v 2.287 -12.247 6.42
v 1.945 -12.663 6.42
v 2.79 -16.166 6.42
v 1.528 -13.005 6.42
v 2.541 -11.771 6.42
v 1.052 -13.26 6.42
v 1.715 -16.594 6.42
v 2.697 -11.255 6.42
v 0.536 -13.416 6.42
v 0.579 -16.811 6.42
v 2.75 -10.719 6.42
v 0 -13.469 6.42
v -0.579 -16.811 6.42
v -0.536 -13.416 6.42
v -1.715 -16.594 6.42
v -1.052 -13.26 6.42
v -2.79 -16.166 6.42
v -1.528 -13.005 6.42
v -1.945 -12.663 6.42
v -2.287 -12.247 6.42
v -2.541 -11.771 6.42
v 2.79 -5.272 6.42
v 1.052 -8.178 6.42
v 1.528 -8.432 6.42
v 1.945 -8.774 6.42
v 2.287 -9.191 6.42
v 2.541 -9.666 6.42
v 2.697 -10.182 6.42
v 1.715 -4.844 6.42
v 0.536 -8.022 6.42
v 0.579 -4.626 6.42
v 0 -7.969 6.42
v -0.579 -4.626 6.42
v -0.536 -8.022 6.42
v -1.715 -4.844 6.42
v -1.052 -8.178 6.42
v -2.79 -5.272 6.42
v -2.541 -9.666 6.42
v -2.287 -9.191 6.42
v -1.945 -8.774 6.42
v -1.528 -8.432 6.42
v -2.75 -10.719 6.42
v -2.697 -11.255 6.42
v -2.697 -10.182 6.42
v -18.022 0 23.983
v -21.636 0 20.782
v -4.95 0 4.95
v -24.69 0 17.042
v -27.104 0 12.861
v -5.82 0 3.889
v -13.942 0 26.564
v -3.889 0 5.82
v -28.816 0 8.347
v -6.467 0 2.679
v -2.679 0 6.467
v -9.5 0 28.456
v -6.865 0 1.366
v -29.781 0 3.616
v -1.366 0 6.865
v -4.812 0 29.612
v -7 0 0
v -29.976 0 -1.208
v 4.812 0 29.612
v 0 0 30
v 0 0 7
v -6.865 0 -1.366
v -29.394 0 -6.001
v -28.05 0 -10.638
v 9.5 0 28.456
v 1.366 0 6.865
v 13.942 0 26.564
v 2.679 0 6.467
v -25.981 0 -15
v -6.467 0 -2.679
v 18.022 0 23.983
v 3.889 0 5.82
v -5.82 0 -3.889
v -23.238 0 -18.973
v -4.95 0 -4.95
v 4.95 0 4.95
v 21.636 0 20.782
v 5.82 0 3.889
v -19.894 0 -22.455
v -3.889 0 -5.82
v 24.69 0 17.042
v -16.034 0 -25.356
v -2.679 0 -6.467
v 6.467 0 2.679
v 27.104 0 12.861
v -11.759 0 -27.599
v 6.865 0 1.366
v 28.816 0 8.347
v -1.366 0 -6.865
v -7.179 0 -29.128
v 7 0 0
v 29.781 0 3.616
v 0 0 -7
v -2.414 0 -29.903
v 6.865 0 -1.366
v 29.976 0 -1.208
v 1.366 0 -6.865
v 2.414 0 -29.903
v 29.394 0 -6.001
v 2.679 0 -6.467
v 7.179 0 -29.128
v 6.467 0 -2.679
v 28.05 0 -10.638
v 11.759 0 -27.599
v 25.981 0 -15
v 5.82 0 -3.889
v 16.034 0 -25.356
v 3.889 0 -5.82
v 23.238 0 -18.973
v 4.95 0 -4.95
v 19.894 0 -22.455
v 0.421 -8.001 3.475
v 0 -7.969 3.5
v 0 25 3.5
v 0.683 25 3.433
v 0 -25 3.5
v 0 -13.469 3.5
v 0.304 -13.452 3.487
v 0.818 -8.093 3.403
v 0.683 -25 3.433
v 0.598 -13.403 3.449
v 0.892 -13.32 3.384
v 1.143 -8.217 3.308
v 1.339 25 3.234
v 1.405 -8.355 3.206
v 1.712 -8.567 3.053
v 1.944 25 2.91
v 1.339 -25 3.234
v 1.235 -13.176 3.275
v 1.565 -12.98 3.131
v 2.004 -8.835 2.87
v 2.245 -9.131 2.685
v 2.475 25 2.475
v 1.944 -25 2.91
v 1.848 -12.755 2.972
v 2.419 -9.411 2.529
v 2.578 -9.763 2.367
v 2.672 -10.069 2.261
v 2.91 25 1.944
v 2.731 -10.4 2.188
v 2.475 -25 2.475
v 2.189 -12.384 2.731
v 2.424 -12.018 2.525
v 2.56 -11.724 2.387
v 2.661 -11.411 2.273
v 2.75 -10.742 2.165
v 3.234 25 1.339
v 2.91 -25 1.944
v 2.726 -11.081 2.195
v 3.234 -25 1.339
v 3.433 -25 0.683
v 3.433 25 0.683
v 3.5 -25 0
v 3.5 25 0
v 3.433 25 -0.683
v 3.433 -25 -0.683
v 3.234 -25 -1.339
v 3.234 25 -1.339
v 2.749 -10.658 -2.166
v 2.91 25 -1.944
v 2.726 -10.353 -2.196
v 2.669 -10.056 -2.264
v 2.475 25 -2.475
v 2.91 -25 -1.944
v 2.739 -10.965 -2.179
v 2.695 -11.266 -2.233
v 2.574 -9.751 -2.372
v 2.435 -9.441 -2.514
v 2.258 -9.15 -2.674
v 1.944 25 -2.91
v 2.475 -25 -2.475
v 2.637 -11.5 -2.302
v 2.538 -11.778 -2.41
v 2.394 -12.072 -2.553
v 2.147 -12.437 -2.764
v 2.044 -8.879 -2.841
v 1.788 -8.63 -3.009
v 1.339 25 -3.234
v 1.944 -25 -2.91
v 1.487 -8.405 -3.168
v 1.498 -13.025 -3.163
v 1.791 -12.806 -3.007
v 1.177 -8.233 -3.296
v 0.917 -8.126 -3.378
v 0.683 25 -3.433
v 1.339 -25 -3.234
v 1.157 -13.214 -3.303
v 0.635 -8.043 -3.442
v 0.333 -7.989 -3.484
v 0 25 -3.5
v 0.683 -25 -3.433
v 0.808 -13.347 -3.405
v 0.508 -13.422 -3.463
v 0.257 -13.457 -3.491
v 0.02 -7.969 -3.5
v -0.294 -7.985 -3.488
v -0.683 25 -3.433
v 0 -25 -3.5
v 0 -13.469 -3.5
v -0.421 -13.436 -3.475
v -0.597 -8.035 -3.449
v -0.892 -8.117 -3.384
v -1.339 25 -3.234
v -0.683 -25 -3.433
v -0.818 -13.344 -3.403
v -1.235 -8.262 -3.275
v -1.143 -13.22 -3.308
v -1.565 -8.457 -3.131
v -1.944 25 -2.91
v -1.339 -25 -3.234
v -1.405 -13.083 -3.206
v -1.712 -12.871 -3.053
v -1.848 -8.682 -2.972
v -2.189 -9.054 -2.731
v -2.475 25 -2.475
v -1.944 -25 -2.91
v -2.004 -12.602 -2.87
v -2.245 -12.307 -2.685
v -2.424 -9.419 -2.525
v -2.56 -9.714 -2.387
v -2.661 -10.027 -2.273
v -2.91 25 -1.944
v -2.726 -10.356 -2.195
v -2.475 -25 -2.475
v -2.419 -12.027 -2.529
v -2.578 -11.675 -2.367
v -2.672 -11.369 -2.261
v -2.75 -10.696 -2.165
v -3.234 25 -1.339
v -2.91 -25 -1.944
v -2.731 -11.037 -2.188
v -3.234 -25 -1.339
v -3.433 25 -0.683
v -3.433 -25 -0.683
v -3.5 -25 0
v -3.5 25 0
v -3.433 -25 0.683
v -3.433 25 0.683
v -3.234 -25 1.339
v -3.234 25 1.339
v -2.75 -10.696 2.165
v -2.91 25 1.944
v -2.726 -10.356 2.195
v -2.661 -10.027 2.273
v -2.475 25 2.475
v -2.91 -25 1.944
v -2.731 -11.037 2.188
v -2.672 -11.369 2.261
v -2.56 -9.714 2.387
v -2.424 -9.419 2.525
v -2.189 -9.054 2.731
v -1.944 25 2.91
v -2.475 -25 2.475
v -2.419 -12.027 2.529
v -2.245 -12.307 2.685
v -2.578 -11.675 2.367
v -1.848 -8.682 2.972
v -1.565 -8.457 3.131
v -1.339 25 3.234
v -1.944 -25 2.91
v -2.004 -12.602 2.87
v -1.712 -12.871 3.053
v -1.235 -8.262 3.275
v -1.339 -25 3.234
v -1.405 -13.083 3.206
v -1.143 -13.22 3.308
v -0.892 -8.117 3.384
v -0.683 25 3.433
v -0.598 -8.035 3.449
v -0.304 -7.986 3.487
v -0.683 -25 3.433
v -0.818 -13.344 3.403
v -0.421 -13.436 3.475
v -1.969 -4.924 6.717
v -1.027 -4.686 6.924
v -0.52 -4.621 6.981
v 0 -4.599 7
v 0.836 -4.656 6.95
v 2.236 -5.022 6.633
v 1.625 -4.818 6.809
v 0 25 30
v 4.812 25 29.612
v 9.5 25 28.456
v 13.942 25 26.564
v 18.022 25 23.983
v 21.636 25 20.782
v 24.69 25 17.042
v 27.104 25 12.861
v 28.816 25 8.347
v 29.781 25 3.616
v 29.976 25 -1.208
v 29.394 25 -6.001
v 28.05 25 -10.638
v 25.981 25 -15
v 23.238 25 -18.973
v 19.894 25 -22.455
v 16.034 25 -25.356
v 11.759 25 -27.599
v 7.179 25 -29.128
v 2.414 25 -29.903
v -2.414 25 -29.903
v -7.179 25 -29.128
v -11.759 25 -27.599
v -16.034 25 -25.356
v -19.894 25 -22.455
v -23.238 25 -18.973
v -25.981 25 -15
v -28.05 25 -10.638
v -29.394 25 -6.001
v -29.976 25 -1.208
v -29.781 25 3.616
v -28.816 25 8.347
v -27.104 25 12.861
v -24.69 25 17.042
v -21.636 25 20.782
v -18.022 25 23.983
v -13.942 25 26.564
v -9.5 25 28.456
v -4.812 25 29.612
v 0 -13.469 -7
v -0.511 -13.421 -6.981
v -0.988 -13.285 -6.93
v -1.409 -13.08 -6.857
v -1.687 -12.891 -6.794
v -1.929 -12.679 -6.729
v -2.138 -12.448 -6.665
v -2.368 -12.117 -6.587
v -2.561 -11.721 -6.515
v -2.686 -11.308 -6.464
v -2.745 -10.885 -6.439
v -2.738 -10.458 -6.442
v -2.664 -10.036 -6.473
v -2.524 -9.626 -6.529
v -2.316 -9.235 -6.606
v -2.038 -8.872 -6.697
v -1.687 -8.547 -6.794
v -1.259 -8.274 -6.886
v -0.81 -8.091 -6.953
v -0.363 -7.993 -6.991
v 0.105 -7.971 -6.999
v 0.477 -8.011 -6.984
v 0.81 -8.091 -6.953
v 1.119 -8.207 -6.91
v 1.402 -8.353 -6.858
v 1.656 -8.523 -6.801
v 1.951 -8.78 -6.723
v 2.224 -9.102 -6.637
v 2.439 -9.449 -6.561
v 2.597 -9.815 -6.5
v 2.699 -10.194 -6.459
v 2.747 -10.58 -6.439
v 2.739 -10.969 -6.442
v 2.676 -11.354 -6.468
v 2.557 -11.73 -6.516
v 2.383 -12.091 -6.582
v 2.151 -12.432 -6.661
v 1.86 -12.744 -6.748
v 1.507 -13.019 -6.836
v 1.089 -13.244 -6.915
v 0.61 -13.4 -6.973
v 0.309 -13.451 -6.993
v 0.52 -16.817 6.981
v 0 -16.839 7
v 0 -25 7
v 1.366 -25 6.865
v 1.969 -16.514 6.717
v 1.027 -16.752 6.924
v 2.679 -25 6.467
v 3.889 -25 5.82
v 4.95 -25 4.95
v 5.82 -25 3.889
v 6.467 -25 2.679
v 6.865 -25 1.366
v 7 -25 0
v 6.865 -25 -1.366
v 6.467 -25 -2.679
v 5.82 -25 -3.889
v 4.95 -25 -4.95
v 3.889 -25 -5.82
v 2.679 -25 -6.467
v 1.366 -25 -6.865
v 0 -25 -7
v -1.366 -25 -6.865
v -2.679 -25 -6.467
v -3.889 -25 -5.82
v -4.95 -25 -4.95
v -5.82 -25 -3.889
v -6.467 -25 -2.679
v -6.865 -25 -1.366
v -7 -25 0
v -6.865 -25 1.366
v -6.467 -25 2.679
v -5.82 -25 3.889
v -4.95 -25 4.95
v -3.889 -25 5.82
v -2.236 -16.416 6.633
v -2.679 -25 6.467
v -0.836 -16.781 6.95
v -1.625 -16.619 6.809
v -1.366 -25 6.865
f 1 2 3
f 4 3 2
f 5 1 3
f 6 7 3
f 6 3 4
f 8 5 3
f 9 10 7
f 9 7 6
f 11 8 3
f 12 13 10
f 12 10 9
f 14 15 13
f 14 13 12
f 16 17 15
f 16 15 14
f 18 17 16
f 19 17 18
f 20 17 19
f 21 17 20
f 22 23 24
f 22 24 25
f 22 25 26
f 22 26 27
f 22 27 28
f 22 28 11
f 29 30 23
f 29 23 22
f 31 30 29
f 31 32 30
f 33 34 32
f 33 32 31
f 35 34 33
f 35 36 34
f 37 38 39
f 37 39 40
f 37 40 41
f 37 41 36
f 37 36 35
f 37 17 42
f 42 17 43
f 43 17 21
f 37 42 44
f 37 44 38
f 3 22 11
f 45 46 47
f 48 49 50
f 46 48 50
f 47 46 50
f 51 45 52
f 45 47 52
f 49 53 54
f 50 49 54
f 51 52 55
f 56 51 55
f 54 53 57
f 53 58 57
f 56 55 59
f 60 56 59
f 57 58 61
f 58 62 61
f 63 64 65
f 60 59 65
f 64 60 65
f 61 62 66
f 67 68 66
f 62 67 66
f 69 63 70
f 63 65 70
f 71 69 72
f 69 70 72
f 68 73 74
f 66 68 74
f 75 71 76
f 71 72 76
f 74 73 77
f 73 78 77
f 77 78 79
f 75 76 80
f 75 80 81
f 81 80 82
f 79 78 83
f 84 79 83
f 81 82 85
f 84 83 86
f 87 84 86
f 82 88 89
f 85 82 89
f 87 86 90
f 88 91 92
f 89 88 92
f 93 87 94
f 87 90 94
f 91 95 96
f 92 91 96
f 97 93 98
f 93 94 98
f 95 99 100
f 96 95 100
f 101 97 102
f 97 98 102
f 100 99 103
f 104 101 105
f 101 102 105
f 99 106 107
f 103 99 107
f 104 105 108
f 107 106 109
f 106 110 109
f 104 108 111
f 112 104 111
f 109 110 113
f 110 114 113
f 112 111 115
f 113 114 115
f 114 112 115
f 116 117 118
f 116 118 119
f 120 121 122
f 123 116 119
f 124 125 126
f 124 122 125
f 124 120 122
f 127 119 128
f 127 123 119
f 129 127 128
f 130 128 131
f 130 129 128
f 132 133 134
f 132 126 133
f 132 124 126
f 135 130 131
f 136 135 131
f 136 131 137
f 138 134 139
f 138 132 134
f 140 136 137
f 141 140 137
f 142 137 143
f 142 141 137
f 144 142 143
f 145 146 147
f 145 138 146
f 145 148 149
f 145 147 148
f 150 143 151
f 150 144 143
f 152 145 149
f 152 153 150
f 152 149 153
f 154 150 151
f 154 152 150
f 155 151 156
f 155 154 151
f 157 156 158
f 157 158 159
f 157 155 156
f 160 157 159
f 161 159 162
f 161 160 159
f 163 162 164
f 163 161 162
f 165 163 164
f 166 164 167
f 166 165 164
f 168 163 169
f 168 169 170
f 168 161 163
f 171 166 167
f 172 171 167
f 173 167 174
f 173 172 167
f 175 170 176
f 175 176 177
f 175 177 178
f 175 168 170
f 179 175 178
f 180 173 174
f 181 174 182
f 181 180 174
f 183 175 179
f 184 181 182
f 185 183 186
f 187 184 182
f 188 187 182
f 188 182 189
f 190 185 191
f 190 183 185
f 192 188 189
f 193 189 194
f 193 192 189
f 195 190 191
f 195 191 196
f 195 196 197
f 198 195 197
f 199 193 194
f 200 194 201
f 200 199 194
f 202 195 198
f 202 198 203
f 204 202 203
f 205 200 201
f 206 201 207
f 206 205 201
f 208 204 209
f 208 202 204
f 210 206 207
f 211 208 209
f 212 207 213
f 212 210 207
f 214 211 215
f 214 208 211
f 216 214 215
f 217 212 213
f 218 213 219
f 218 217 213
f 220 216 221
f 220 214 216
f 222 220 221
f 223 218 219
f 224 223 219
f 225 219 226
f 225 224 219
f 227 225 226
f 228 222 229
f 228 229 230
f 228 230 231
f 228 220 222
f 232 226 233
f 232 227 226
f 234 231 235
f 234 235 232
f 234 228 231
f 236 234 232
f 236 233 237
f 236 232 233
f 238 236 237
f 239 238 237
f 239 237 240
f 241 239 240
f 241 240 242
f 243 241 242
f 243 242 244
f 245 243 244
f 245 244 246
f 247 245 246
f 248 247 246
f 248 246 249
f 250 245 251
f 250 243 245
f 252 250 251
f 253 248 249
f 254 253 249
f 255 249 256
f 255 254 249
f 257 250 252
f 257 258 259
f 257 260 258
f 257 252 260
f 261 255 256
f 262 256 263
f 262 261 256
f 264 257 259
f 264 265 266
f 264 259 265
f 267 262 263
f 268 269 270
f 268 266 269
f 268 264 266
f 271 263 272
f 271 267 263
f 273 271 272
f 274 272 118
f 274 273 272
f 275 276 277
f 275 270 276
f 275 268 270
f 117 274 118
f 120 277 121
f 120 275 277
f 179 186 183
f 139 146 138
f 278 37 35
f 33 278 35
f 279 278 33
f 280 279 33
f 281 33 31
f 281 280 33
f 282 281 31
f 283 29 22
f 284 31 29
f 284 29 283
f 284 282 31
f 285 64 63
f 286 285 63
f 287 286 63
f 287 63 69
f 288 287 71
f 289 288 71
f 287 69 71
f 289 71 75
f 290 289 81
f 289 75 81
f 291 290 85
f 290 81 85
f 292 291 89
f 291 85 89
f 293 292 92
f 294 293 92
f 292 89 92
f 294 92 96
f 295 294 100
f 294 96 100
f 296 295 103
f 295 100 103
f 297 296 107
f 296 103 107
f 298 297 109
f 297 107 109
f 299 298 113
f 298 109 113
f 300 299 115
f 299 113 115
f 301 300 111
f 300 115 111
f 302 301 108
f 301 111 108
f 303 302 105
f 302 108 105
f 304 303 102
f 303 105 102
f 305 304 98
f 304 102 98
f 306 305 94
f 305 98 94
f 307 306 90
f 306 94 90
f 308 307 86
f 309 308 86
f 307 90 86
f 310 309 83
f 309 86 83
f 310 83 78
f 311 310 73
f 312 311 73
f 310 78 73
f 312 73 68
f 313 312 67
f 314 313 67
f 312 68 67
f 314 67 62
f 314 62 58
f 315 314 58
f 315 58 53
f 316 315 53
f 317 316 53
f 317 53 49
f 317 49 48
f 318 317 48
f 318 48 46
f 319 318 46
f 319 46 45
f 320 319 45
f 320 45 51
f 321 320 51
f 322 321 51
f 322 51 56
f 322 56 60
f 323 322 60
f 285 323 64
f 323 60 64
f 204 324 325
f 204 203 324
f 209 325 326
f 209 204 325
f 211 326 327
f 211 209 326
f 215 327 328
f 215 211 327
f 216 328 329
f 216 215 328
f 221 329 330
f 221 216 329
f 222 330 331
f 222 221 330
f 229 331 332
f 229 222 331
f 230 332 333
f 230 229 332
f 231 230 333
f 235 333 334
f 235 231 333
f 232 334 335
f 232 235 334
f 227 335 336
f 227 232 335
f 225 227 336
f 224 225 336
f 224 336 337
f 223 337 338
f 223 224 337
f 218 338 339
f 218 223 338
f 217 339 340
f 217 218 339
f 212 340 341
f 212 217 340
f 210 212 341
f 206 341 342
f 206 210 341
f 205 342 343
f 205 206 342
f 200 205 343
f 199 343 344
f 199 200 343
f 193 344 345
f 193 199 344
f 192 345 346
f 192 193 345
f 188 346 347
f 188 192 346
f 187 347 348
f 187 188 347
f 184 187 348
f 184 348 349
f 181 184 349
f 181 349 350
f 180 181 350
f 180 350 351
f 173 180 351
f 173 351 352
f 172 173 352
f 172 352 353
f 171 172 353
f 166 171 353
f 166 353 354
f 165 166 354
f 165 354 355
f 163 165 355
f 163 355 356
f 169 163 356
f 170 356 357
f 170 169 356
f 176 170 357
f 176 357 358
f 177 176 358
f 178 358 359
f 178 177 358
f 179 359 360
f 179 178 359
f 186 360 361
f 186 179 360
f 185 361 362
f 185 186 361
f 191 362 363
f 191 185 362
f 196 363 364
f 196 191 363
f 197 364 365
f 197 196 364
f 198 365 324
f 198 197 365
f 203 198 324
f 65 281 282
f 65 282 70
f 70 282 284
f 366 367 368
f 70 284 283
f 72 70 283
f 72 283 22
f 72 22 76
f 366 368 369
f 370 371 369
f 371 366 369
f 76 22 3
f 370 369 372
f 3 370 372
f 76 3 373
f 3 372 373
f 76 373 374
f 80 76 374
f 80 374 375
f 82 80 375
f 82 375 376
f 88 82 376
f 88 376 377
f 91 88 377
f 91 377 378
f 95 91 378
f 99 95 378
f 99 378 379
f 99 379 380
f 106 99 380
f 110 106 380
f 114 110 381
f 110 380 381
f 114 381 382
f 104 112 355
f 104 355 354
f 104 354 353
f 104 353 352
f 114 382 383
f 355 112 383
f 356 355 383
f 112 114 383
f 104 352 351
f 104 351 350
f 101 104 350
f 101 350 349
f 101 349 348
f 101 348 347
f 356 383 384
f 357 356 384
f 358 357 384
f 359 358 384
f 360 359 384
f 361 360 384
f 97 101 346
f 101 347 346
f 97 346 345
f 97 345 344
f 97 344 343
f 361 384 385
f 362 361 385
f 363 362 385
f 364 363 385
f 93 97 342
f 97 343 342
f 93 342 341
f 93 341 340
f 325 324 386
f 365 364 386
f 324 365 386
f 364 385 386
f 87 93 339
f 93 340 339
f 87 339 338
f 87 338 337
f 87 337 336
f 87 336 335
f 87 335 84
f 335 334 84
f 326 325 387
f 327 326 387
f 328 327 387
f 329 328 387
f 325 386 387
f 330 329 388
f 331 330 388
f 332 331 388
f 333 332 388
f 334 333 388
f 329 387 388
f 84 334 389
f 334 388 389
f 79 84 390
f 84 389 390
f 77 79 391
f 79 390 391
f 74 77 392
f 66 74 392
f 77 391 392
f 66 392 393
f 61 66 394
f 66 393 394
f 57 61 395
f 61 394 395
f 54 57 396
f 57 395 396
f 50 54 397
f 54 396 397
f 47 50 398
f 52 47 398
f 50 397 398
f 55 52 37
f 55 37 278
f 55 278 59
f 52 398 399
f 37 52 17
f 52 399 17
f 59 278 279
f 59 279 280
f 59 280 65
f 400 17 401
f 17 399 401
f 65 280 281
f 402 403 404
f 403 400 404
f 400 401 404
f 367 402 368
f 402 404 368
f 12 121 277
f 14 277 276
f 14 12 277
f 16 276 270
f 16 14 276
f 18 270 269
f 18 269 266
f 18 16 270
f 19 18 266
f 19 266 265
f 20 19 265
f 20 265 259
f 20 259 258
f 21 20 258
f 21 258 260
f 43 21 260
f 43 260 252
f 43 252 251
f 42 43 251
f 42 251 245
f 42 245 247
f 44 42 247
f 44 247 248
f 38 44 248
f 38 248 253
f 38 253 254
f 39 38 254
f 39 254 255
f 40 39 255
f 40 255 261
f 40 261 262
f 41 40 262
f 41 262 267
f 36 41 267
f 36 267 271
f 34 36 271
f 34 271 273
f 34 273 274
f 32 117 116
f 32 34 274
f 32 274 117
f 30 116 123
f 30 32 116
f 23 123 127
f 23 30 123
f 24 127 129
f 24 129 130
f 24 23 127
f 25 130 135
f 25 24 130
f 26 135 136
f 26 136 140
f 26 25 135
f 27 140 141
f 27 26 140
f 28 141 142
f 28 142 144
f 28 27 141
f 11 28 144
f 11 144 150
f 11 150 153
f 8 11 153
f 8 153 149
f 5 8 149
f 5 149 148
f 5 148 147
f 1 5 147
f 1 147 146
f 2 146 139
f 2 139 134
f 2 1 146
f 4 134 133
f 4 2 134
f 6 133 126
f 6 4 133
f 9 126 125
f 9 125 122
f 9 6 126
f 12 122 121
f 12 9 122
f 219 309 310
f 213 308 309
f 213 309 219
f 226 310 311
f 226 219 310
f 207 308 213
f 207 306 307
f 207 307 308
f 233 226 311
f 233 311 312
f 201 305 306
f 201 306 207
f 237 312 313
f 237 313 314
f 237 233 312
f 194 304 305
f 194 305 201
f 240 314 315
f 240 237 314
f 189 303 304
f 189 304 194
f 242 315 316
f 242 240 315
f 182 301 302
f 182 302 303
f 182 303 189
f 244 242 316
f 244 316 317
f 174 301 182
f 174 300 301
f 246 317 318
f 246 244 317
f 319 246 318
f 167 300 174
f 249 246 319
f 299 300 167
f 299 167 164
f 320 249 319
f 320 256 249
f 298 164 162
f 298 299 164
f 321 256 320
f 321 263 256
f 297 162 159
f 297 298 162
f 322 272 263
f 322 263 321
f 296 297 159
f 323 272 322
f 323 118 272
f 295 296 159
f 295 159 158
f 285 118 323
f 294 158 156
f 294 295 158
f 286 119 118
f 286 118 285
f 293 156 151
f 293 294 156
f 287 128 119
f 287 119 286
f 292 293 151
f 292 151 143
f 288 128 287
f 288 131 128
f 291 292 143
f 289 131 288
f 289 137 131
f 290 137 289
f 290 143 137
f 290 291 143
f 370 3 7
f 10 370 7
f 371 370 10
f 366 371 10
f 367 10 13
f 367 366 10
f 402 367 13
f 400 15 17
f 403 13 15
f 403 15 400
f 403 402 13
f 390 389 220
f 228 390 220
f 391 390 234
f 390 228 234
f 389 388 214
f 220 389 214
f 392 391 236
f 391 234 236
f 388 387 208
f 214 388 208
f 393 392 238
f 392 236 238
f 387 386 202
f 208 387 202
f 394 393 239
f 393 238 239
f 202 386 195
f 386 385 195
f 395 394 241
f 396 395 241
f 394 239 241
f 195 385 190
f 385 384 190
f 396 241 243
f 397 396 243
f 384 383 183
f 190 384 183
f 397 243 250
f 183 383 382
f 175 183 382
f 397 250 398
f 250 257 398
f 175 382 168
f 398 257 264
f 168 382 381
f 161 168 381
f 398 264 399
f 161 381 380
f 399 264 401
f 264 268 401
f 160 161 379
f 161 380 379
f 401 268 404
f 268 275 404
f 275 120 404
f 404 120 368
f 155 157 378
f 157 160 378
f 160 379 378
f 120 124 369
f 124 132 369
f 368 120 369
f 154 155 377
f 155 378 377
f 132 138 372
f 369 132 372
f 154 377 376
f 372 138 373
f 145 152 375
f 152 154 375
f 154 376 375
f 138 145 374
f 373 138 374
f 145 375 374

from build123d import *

# Parameters (mm, degrees)
SKETCH5_R           = 30
SKETCH5_R_2         = 7
BOSS_EXTRUDE5_DEPTH = 25
SKETCH5_6_R         = 7
BOSS_EXTRUDE6_DEPTH = 25
SKETCH5_8_R         = 3.5
CUT_EXTRUDE1_DEPTH  = 25
BOSS_EXTRUDE7_START = -25
SKETCH5_9_R         = 7
SKETCH5_9_R_2       = 3.5
BOSS_EXTRUDE7_DEPTH = 25


with BuildPart() as part:
    # Sketch5 → Boss-Extrude5 (new body)
    with BuildSketch(Plane(origin=(0, 0, 0), x_dir=(1, 0, 0), z_dir=(0, 1, 0))):
        Circle(SKETCH5_R)
        Circle(SKETCH5_R_2, mode=Mode.SUBTRACT)
    extrude(amount=BOSS_EXTRUDE5_DEPTH)

    # Sketch5<6> → Boss-Extrude6 (add)
    with BuildSketch(Plane(origin=(0, 0, 0), x_dir=(1, 0, 0), z_dir=(0, 1, 0))):
        Circle(SKETCH5_6_R)
    extrude(amount=BOSS_EXTRUDE6_DEPTH)

    # Sketch5<8> → Cut-Extrude1 (cut)
    with BuildSketch(Plane(origin=(0, 0, 0), x_dir=(1, 0, 0), z_dir=(0, 1, 0))):
        Circle(SKETCH5_8_R)
    extrude(amount=CUT_EXTRUDE1_DEPTH, mode=Mode.SUBTRACT)

    # Sketch5<9> → Boss-Extrude7 (add)
    with BuildSketch(Plane(origin=(0, 0, 0), x_dir=(1, 0, 0), z_dir=(0, 1, 0)).offset(BOSS_EXTRUDE7_START)):
        Circle(SKETCH5_9_R)
        Circle(SKETCH5_9_R_2, mode=Mode.SUBTRACT)
    extrude(amount=BOSS_EXTRUDE7_DEPTH)

    # Sketch9 → CBORE for M5 Hex Head Bolt1 (revolve, cut)
    with BuildSketch(Plane(origin=(0, -10.718846388, 10), x_dir=(0, -1, 0), z_dir=(1, 0, 0))):
        Polygon((0, 0), (0, 40), (2.75, 40), (2.75, 3.58), (6.12, 3.58), (6.12, 0.025), (6.145, 0), align=None)
    revolve(axis=Axis((0, -10.718846388, 16.35), (0, 0, -1)), mode=Mode.SUBTRACT)


solid = part.part
